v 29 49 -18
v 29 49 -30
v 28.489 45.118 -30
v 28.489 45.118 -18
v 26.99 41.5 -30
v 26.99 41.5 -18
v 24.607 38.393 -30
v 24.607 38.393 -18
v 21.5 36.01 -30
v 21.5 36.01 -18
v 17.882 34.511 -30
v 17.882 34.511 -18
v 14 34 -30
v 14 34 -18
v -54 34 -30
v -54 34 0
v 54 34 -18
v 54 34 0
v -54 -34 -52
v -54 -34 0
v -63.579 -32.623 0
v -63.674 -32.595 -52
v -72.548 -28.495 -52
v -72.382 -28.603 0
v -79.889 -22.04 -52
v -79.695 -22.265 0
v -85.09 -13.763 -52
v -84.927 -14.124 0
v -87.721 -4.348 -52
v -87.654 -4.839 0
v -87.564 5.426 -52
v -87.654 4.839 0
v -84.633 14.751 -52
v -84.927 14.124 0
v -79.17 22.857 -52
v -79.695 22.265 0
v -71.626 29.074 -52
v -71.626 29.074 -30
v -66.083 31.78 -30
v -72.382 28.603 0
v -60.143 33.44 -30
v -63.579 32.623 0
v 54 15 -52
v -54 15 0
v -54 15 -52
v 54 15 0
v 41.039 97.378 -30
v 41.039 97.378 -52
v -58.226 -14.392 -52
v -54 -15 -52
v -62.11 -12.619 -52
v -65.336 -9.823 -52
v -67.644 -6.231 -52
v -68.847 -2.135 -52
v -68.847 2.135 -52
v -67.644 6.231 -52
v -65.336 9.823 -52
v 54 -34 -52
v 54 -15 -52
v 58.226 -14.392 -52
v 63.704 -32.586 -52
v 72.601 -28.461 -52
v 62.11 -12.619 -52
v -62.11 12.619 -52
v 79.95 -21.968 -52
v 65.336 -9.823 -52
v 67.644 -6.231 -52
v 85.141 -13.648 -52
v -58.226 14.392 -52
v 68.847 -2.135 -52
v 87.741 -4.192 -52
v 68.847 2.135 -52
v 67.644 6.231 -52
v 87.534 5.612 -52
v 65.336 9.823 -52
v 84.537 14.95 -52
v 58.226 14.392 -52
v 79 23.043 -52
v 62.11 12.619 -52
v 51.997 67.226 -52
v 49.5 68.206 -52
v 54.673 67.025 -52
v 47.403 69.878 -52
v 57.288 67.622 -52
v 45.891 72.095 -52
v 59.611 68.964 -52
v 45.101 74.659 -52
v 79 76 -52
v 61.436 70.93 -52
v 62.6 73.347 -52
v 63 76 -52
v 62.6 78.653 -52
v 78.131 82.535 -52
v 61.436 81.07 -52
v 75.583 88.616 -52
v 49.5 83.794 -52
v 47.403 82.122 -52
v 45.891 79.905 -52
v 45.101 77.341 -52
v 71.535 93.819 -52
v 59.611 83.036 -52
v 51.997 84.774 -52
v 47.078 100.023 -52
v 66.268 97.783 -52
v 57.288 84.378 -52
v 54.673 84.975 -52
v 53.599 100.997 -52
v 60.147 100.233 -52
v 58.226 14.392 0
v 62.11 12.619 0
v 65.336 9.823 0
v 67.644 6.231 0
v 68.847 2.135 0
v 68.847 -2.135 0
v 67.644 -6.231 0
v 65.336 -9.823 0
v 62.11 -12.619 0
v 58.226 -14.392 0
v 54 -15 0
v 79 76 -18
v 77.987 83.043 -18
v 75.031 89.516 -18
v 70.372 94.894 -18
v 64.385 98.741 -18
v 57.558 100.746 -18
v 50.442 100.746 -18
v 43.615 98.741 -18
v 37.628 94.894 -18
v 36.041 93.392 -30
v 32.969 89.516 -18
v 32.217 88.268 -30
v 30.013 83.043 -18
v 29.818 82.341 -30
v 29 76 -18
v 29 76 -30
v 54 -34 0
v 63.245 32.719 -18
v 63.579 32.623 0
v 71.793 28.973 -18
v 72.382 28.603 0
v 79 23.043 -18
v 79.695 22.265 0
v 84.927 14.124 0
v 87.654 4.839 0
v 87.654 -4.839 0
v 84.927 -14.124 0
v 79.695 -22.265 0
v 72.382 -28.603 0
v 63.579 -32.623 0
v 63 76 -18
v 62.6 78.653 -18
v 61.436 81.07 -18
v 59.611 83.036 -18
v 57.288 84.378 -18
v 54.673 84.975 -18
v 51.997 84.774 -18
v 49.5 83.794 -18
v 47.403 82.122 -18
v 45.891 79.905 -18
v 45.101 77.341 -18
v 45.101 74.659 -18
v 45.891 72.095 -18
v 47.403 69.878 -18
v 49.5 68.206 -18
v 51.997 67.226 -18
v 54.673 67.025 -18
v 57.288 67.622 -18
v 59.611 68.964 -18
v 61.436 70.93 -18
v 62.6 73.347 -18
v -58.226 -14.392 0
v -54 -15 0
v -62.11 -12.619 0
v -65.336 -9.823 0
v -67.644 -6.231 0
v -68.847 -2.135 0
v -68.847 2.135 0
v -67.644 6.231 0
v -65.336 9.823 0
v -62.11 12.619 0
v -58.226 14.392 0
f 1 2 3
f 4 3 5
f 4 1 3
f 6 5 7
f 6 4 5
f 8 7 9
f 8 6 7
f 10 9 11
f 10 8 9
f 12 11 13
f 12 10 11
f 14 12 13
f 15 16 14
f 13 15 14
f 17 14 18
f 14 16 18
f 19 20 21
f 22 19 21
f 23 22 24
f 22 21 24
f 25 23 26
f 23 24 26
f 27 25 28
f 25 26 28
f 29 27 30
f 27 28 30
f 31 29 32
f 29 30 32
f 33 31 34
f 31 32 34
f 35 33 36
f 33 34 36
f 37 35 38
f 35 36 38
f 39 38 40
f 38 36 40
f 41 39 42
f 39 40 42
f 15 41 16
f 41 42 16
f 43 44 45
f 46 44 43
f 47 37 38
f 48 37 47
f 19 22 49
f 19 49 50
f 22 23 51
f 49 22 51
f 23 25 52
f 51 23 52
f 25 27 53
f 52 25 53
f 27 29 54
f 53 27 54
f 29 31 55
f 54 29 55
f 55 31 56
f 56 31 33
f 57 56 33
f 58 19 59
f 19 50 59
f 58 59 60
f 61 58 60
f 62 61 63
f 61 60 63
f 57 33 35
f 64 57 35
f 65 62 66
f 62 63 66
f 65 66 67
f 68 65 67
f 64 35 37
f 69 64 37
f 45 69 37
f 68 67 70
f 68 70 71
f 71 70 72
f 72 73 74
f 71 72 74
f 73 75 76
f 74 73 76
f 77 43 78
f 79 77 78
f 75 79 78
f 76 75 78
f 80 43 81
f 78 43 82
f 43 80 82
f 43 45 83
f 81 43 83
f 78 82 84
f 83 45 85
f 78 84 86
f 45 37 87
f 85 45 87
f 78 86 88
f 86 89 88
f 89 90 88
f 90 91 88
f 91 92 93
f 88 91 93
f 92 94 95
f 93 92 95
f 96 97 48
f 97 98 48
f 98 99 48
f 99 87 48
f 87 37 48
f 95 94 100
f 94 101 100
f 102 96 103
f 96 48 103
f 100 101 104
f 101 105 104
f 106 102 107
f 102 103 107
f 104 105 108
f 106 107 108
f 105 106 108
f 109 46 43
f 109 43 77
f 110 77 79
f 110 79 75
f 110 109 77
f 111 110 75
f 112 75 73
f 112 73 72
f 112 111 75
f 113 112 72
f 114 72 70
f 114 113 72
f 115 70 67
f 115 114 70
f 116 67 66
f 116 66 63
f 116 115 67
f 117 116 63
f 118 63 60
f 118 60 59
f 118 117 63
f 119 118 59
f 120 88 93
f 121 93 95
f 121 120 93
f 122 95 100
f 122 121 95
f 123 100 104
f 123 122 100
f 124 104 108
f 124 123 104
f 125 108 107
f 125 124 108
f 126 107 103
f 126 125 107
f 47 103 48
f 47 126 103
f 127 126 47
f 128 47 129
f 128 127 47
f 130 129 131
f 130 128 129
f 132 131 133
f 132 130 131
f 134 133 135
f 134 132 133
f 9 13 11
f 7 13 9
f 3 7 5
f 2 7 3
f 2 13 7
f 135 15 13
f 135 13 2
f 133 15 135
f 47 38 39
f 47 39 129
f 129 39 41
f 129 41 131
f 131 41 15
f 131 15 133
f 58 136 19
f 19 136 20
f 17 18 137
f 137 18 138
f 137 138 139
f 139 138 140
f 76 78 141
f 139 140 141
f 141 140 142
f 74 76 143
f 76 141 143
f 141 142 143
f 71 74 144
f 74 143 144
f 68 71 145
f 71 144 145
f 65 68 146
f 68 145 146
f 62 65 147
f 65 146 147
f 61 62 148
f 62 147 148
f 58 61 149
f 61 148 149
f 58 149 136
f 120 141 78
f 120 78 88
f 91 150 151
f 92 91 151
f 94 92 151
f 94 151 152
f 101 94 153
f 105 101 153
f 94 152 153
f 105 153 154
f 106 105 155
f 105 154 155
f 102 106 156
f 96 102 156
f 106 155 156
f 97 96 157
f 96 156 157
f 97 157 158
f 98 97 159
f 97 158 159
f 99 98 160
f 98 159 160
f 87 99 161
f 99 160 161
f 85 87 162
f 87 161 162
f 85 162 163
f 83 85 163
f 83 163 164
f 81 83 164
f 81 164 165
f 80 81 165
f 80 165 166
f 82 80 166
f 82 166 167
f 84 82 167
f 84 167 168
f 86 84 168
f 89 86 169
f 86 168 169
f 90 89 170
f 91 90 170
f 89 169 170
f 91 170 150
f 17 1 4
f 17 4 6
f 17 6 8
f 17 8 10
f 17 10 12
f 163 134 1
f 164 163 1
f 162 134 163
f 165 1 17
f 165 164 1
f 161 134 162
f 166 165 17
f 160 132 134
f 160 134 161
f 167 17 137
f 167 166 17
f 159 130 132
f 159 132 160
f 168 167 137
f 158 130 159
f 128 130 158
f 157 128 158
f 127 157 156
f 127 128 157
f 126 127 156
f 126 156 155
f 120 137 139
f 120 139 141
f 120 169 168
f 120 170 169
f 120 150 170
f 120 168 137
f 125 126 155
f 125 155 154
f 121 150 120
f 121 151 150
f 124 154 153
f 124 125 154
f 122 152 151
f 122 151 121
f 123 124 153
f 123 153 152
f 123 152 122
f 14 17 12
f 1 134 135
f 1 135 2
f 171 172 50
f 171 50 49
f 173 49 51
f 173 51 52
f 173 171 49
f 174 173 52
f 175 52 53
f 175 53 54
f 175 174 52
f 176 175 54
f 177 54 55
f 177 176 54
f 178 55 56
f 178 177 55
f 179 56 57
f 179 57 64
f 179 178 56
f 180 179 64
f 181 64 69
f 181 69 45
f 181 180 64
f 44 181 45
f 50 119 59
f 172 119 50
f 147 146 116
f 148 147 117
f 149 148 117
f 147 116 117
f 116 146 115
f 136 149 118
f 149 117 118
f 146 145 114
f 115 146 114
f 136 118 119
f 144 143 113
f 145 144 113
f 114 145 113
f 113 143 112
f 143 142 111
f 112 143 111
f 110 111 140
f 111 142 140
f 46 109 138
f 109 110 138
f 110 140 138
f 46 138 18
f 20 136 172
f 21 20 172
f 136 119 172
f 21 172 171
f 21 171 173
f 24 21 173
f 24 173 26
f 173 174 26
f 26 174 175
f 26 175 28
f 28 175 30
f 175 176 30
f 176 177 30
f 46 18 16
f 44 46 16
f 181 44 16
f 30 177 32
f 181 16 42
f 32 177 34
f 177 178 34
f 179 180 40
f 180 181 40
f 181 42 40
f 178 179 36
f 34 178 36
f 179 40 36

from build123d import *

# Parameters (mm, degrees)
Y_KSEKLIK_EKSTR_ZYON1_DEPTH = 52
IZIM3_R                     = 9
Y_KSEKLIK_EKSTR_ZYON2_DEPTH = 34
FEDER1_REACH                = 139.277
IZIM4_WALL_W                = 408.307741914
IZIM4_WALL_H                = 22


with BuildPart() as part:
    # Çizim1 → Yükseklik-Ekstrüzyon1 (new body)
    with BuildSketch(Plane.XY):
        with BuildLine():
            Line((-54, 34), (54, 34))
            ThreePointArc((54, 34), (88, 0), (54, -34))
            Line((54, -34), (-54, -34))
            ThreePointArc((-54, -34), (-88, 0), (-54, 34))
        make_face()
        with BuildLine():
            Line((-54, 15), (54, 15))
            ThreePointArc((54, 15), (69, 0), (54, -15))
            Line((54, -15), (-54, -15))
            ThreePointArc((-54, -15), (-69, 0), (-54, 15))
        make_face(mode=Mode.SUBTRACT)
    extrude(amount=-Y_KSEKLIK_EKSTR_ZYON1_DEPTH)

    # Çizim3 → Yükseklik-Ekstrüzyon2 (add)
    with BuildSketch(Plane.XY.offset(-18)):
        with BuildLine():
            ThreePointArc((79, 76), (54, 101), (29, 76))
            Line((29, 76), (29, 49))
            ThreePointArc((29, 49), (24.606601718, 38.393398282), (14, 34))
            Line((14, 34), (54, 34))
            ThreePointArc((54, 34), (67.647767834, 31.140623519), (79, 23.043437244))
            Line((79, 23.043437244), (79, 76))
        make_face()
        with Locations((54, 76)):
            Circle(IZIM3_R, mode=Mode.SUBTRACT)
    extrude(amount=-Y_KSEKLIK_EKSTR_ZYON2_DEPTH)

    # Çizim4 wall → Feder1 (add, up to next)
    with BuildSketch(Plane(origin=(-15.293433294, 63.226194681, -30), x_dir=(0.855125243419, 0.518421467599, 0), z_dir=(-0.518421467599, 0.855125243419, 0)), mode=Mode.PRIVATE) as feder1_sk1:
        with Locations((0, 11)):
            Rectangle(IZIM4_WALL_W, IZIM4_WALL_H)
    feder1_tool1 = extrude(feder1_sk1.sketch, amount=-FEDER1_REACH, mode=Mode.PRIVATE) - part.part
    add(feder1_tool1.solids().sort_by_distance((-15.293433294, 63.226194681, -30))[0])


solid = part.part
